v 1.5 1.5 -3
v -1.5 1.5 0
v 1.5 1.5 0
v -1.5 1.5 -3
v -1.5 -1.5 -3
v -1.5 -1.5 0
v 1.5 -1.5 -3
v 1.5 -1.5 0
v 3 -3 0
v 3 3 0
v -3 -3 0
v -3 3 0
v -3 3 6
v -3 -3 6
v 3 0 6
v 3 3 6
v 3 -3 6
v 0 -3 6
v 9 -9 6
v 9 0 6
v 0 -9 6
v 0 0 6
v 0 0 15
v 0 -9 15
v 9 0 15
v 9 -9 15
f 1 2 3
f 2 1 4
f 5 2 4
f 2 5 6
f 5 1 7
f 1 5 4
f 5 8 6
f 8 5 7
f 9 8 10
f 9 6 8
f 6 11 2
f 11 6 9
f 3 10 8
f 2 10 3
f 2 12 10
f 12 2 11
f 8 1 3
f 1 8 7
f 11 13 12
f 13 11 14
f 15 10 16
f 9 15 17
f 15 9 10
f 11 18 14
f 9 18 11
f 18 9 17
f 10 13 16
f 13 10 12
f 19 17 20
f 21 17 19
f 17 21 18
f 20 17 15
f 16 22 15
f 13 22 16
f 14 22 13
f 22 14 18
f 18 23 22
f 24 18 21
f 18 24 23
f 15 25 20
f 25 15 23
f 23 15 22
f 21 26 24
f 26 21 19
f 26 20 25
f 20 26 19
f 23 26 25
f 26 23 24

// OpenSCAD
// Start: lazy_union
default_5_default_5();
// End: lazy_union

// Modules.

// 'PartMaterial undef-default - undef-default'
module default_5_default_5() {
  // 'None : _combine_solids_and_holes'
  union() {
    // 'box1'
    multmatrix(m=[[1.0, 0.0, 0.0, -1.5], [0.0, 0.0, 1.0, -1.5], [-0.0, -1.0, -0.0, -0.0], [0.0, 0.0, 0.0, 1.0]]) {
      // 'box1'
      color(c=[0.0, 0.0, 1.0, 1.0]) {
        // 'box1 : _combine_solids_and_holes'
        union() {
          // 'box1'
          cube(size=[3.0, 3.0, 3.0]);
        }
      }
    }
    // 'box2'
    multmatrix(m=[[1.0, 0.0, 0.0, -3.0], [0.0, 0.0, -1.0, 3.0], [0.0, 1.0, 0.0, 0.0], [0.0, 0.0, 0.0, 1.0]]) {
      // 'box2'
      color(c=[0.0, 1.0, 0.0, 1.0]) {
        // 'box2 : _combine_solids_and_holes'
        union() {
          // 'box2'
          cube(size=[6.0, 6.0, 6.0]);
        }
      }
    }
    // 'box3'
    multmatrix(m=[[-1.0, 0.0, 0.0, 9.0], [0.0, 0.0, 1.0, -9.0], [0.0, 1.0, 0.0, 6.0], [0.0, 0.0, 0.0, 1.0]]) {
      // 'box3'
      color(c=[1.0, 0.0, 0.0, 1.0]) {
        // 'box3 : _combine_solids_and_holes'
        union() {
          // 'box3'
          cube(size=[9.0, 9.0, 9.0]);
        }
      }
    }
  }
} // end module default_5_default_5
